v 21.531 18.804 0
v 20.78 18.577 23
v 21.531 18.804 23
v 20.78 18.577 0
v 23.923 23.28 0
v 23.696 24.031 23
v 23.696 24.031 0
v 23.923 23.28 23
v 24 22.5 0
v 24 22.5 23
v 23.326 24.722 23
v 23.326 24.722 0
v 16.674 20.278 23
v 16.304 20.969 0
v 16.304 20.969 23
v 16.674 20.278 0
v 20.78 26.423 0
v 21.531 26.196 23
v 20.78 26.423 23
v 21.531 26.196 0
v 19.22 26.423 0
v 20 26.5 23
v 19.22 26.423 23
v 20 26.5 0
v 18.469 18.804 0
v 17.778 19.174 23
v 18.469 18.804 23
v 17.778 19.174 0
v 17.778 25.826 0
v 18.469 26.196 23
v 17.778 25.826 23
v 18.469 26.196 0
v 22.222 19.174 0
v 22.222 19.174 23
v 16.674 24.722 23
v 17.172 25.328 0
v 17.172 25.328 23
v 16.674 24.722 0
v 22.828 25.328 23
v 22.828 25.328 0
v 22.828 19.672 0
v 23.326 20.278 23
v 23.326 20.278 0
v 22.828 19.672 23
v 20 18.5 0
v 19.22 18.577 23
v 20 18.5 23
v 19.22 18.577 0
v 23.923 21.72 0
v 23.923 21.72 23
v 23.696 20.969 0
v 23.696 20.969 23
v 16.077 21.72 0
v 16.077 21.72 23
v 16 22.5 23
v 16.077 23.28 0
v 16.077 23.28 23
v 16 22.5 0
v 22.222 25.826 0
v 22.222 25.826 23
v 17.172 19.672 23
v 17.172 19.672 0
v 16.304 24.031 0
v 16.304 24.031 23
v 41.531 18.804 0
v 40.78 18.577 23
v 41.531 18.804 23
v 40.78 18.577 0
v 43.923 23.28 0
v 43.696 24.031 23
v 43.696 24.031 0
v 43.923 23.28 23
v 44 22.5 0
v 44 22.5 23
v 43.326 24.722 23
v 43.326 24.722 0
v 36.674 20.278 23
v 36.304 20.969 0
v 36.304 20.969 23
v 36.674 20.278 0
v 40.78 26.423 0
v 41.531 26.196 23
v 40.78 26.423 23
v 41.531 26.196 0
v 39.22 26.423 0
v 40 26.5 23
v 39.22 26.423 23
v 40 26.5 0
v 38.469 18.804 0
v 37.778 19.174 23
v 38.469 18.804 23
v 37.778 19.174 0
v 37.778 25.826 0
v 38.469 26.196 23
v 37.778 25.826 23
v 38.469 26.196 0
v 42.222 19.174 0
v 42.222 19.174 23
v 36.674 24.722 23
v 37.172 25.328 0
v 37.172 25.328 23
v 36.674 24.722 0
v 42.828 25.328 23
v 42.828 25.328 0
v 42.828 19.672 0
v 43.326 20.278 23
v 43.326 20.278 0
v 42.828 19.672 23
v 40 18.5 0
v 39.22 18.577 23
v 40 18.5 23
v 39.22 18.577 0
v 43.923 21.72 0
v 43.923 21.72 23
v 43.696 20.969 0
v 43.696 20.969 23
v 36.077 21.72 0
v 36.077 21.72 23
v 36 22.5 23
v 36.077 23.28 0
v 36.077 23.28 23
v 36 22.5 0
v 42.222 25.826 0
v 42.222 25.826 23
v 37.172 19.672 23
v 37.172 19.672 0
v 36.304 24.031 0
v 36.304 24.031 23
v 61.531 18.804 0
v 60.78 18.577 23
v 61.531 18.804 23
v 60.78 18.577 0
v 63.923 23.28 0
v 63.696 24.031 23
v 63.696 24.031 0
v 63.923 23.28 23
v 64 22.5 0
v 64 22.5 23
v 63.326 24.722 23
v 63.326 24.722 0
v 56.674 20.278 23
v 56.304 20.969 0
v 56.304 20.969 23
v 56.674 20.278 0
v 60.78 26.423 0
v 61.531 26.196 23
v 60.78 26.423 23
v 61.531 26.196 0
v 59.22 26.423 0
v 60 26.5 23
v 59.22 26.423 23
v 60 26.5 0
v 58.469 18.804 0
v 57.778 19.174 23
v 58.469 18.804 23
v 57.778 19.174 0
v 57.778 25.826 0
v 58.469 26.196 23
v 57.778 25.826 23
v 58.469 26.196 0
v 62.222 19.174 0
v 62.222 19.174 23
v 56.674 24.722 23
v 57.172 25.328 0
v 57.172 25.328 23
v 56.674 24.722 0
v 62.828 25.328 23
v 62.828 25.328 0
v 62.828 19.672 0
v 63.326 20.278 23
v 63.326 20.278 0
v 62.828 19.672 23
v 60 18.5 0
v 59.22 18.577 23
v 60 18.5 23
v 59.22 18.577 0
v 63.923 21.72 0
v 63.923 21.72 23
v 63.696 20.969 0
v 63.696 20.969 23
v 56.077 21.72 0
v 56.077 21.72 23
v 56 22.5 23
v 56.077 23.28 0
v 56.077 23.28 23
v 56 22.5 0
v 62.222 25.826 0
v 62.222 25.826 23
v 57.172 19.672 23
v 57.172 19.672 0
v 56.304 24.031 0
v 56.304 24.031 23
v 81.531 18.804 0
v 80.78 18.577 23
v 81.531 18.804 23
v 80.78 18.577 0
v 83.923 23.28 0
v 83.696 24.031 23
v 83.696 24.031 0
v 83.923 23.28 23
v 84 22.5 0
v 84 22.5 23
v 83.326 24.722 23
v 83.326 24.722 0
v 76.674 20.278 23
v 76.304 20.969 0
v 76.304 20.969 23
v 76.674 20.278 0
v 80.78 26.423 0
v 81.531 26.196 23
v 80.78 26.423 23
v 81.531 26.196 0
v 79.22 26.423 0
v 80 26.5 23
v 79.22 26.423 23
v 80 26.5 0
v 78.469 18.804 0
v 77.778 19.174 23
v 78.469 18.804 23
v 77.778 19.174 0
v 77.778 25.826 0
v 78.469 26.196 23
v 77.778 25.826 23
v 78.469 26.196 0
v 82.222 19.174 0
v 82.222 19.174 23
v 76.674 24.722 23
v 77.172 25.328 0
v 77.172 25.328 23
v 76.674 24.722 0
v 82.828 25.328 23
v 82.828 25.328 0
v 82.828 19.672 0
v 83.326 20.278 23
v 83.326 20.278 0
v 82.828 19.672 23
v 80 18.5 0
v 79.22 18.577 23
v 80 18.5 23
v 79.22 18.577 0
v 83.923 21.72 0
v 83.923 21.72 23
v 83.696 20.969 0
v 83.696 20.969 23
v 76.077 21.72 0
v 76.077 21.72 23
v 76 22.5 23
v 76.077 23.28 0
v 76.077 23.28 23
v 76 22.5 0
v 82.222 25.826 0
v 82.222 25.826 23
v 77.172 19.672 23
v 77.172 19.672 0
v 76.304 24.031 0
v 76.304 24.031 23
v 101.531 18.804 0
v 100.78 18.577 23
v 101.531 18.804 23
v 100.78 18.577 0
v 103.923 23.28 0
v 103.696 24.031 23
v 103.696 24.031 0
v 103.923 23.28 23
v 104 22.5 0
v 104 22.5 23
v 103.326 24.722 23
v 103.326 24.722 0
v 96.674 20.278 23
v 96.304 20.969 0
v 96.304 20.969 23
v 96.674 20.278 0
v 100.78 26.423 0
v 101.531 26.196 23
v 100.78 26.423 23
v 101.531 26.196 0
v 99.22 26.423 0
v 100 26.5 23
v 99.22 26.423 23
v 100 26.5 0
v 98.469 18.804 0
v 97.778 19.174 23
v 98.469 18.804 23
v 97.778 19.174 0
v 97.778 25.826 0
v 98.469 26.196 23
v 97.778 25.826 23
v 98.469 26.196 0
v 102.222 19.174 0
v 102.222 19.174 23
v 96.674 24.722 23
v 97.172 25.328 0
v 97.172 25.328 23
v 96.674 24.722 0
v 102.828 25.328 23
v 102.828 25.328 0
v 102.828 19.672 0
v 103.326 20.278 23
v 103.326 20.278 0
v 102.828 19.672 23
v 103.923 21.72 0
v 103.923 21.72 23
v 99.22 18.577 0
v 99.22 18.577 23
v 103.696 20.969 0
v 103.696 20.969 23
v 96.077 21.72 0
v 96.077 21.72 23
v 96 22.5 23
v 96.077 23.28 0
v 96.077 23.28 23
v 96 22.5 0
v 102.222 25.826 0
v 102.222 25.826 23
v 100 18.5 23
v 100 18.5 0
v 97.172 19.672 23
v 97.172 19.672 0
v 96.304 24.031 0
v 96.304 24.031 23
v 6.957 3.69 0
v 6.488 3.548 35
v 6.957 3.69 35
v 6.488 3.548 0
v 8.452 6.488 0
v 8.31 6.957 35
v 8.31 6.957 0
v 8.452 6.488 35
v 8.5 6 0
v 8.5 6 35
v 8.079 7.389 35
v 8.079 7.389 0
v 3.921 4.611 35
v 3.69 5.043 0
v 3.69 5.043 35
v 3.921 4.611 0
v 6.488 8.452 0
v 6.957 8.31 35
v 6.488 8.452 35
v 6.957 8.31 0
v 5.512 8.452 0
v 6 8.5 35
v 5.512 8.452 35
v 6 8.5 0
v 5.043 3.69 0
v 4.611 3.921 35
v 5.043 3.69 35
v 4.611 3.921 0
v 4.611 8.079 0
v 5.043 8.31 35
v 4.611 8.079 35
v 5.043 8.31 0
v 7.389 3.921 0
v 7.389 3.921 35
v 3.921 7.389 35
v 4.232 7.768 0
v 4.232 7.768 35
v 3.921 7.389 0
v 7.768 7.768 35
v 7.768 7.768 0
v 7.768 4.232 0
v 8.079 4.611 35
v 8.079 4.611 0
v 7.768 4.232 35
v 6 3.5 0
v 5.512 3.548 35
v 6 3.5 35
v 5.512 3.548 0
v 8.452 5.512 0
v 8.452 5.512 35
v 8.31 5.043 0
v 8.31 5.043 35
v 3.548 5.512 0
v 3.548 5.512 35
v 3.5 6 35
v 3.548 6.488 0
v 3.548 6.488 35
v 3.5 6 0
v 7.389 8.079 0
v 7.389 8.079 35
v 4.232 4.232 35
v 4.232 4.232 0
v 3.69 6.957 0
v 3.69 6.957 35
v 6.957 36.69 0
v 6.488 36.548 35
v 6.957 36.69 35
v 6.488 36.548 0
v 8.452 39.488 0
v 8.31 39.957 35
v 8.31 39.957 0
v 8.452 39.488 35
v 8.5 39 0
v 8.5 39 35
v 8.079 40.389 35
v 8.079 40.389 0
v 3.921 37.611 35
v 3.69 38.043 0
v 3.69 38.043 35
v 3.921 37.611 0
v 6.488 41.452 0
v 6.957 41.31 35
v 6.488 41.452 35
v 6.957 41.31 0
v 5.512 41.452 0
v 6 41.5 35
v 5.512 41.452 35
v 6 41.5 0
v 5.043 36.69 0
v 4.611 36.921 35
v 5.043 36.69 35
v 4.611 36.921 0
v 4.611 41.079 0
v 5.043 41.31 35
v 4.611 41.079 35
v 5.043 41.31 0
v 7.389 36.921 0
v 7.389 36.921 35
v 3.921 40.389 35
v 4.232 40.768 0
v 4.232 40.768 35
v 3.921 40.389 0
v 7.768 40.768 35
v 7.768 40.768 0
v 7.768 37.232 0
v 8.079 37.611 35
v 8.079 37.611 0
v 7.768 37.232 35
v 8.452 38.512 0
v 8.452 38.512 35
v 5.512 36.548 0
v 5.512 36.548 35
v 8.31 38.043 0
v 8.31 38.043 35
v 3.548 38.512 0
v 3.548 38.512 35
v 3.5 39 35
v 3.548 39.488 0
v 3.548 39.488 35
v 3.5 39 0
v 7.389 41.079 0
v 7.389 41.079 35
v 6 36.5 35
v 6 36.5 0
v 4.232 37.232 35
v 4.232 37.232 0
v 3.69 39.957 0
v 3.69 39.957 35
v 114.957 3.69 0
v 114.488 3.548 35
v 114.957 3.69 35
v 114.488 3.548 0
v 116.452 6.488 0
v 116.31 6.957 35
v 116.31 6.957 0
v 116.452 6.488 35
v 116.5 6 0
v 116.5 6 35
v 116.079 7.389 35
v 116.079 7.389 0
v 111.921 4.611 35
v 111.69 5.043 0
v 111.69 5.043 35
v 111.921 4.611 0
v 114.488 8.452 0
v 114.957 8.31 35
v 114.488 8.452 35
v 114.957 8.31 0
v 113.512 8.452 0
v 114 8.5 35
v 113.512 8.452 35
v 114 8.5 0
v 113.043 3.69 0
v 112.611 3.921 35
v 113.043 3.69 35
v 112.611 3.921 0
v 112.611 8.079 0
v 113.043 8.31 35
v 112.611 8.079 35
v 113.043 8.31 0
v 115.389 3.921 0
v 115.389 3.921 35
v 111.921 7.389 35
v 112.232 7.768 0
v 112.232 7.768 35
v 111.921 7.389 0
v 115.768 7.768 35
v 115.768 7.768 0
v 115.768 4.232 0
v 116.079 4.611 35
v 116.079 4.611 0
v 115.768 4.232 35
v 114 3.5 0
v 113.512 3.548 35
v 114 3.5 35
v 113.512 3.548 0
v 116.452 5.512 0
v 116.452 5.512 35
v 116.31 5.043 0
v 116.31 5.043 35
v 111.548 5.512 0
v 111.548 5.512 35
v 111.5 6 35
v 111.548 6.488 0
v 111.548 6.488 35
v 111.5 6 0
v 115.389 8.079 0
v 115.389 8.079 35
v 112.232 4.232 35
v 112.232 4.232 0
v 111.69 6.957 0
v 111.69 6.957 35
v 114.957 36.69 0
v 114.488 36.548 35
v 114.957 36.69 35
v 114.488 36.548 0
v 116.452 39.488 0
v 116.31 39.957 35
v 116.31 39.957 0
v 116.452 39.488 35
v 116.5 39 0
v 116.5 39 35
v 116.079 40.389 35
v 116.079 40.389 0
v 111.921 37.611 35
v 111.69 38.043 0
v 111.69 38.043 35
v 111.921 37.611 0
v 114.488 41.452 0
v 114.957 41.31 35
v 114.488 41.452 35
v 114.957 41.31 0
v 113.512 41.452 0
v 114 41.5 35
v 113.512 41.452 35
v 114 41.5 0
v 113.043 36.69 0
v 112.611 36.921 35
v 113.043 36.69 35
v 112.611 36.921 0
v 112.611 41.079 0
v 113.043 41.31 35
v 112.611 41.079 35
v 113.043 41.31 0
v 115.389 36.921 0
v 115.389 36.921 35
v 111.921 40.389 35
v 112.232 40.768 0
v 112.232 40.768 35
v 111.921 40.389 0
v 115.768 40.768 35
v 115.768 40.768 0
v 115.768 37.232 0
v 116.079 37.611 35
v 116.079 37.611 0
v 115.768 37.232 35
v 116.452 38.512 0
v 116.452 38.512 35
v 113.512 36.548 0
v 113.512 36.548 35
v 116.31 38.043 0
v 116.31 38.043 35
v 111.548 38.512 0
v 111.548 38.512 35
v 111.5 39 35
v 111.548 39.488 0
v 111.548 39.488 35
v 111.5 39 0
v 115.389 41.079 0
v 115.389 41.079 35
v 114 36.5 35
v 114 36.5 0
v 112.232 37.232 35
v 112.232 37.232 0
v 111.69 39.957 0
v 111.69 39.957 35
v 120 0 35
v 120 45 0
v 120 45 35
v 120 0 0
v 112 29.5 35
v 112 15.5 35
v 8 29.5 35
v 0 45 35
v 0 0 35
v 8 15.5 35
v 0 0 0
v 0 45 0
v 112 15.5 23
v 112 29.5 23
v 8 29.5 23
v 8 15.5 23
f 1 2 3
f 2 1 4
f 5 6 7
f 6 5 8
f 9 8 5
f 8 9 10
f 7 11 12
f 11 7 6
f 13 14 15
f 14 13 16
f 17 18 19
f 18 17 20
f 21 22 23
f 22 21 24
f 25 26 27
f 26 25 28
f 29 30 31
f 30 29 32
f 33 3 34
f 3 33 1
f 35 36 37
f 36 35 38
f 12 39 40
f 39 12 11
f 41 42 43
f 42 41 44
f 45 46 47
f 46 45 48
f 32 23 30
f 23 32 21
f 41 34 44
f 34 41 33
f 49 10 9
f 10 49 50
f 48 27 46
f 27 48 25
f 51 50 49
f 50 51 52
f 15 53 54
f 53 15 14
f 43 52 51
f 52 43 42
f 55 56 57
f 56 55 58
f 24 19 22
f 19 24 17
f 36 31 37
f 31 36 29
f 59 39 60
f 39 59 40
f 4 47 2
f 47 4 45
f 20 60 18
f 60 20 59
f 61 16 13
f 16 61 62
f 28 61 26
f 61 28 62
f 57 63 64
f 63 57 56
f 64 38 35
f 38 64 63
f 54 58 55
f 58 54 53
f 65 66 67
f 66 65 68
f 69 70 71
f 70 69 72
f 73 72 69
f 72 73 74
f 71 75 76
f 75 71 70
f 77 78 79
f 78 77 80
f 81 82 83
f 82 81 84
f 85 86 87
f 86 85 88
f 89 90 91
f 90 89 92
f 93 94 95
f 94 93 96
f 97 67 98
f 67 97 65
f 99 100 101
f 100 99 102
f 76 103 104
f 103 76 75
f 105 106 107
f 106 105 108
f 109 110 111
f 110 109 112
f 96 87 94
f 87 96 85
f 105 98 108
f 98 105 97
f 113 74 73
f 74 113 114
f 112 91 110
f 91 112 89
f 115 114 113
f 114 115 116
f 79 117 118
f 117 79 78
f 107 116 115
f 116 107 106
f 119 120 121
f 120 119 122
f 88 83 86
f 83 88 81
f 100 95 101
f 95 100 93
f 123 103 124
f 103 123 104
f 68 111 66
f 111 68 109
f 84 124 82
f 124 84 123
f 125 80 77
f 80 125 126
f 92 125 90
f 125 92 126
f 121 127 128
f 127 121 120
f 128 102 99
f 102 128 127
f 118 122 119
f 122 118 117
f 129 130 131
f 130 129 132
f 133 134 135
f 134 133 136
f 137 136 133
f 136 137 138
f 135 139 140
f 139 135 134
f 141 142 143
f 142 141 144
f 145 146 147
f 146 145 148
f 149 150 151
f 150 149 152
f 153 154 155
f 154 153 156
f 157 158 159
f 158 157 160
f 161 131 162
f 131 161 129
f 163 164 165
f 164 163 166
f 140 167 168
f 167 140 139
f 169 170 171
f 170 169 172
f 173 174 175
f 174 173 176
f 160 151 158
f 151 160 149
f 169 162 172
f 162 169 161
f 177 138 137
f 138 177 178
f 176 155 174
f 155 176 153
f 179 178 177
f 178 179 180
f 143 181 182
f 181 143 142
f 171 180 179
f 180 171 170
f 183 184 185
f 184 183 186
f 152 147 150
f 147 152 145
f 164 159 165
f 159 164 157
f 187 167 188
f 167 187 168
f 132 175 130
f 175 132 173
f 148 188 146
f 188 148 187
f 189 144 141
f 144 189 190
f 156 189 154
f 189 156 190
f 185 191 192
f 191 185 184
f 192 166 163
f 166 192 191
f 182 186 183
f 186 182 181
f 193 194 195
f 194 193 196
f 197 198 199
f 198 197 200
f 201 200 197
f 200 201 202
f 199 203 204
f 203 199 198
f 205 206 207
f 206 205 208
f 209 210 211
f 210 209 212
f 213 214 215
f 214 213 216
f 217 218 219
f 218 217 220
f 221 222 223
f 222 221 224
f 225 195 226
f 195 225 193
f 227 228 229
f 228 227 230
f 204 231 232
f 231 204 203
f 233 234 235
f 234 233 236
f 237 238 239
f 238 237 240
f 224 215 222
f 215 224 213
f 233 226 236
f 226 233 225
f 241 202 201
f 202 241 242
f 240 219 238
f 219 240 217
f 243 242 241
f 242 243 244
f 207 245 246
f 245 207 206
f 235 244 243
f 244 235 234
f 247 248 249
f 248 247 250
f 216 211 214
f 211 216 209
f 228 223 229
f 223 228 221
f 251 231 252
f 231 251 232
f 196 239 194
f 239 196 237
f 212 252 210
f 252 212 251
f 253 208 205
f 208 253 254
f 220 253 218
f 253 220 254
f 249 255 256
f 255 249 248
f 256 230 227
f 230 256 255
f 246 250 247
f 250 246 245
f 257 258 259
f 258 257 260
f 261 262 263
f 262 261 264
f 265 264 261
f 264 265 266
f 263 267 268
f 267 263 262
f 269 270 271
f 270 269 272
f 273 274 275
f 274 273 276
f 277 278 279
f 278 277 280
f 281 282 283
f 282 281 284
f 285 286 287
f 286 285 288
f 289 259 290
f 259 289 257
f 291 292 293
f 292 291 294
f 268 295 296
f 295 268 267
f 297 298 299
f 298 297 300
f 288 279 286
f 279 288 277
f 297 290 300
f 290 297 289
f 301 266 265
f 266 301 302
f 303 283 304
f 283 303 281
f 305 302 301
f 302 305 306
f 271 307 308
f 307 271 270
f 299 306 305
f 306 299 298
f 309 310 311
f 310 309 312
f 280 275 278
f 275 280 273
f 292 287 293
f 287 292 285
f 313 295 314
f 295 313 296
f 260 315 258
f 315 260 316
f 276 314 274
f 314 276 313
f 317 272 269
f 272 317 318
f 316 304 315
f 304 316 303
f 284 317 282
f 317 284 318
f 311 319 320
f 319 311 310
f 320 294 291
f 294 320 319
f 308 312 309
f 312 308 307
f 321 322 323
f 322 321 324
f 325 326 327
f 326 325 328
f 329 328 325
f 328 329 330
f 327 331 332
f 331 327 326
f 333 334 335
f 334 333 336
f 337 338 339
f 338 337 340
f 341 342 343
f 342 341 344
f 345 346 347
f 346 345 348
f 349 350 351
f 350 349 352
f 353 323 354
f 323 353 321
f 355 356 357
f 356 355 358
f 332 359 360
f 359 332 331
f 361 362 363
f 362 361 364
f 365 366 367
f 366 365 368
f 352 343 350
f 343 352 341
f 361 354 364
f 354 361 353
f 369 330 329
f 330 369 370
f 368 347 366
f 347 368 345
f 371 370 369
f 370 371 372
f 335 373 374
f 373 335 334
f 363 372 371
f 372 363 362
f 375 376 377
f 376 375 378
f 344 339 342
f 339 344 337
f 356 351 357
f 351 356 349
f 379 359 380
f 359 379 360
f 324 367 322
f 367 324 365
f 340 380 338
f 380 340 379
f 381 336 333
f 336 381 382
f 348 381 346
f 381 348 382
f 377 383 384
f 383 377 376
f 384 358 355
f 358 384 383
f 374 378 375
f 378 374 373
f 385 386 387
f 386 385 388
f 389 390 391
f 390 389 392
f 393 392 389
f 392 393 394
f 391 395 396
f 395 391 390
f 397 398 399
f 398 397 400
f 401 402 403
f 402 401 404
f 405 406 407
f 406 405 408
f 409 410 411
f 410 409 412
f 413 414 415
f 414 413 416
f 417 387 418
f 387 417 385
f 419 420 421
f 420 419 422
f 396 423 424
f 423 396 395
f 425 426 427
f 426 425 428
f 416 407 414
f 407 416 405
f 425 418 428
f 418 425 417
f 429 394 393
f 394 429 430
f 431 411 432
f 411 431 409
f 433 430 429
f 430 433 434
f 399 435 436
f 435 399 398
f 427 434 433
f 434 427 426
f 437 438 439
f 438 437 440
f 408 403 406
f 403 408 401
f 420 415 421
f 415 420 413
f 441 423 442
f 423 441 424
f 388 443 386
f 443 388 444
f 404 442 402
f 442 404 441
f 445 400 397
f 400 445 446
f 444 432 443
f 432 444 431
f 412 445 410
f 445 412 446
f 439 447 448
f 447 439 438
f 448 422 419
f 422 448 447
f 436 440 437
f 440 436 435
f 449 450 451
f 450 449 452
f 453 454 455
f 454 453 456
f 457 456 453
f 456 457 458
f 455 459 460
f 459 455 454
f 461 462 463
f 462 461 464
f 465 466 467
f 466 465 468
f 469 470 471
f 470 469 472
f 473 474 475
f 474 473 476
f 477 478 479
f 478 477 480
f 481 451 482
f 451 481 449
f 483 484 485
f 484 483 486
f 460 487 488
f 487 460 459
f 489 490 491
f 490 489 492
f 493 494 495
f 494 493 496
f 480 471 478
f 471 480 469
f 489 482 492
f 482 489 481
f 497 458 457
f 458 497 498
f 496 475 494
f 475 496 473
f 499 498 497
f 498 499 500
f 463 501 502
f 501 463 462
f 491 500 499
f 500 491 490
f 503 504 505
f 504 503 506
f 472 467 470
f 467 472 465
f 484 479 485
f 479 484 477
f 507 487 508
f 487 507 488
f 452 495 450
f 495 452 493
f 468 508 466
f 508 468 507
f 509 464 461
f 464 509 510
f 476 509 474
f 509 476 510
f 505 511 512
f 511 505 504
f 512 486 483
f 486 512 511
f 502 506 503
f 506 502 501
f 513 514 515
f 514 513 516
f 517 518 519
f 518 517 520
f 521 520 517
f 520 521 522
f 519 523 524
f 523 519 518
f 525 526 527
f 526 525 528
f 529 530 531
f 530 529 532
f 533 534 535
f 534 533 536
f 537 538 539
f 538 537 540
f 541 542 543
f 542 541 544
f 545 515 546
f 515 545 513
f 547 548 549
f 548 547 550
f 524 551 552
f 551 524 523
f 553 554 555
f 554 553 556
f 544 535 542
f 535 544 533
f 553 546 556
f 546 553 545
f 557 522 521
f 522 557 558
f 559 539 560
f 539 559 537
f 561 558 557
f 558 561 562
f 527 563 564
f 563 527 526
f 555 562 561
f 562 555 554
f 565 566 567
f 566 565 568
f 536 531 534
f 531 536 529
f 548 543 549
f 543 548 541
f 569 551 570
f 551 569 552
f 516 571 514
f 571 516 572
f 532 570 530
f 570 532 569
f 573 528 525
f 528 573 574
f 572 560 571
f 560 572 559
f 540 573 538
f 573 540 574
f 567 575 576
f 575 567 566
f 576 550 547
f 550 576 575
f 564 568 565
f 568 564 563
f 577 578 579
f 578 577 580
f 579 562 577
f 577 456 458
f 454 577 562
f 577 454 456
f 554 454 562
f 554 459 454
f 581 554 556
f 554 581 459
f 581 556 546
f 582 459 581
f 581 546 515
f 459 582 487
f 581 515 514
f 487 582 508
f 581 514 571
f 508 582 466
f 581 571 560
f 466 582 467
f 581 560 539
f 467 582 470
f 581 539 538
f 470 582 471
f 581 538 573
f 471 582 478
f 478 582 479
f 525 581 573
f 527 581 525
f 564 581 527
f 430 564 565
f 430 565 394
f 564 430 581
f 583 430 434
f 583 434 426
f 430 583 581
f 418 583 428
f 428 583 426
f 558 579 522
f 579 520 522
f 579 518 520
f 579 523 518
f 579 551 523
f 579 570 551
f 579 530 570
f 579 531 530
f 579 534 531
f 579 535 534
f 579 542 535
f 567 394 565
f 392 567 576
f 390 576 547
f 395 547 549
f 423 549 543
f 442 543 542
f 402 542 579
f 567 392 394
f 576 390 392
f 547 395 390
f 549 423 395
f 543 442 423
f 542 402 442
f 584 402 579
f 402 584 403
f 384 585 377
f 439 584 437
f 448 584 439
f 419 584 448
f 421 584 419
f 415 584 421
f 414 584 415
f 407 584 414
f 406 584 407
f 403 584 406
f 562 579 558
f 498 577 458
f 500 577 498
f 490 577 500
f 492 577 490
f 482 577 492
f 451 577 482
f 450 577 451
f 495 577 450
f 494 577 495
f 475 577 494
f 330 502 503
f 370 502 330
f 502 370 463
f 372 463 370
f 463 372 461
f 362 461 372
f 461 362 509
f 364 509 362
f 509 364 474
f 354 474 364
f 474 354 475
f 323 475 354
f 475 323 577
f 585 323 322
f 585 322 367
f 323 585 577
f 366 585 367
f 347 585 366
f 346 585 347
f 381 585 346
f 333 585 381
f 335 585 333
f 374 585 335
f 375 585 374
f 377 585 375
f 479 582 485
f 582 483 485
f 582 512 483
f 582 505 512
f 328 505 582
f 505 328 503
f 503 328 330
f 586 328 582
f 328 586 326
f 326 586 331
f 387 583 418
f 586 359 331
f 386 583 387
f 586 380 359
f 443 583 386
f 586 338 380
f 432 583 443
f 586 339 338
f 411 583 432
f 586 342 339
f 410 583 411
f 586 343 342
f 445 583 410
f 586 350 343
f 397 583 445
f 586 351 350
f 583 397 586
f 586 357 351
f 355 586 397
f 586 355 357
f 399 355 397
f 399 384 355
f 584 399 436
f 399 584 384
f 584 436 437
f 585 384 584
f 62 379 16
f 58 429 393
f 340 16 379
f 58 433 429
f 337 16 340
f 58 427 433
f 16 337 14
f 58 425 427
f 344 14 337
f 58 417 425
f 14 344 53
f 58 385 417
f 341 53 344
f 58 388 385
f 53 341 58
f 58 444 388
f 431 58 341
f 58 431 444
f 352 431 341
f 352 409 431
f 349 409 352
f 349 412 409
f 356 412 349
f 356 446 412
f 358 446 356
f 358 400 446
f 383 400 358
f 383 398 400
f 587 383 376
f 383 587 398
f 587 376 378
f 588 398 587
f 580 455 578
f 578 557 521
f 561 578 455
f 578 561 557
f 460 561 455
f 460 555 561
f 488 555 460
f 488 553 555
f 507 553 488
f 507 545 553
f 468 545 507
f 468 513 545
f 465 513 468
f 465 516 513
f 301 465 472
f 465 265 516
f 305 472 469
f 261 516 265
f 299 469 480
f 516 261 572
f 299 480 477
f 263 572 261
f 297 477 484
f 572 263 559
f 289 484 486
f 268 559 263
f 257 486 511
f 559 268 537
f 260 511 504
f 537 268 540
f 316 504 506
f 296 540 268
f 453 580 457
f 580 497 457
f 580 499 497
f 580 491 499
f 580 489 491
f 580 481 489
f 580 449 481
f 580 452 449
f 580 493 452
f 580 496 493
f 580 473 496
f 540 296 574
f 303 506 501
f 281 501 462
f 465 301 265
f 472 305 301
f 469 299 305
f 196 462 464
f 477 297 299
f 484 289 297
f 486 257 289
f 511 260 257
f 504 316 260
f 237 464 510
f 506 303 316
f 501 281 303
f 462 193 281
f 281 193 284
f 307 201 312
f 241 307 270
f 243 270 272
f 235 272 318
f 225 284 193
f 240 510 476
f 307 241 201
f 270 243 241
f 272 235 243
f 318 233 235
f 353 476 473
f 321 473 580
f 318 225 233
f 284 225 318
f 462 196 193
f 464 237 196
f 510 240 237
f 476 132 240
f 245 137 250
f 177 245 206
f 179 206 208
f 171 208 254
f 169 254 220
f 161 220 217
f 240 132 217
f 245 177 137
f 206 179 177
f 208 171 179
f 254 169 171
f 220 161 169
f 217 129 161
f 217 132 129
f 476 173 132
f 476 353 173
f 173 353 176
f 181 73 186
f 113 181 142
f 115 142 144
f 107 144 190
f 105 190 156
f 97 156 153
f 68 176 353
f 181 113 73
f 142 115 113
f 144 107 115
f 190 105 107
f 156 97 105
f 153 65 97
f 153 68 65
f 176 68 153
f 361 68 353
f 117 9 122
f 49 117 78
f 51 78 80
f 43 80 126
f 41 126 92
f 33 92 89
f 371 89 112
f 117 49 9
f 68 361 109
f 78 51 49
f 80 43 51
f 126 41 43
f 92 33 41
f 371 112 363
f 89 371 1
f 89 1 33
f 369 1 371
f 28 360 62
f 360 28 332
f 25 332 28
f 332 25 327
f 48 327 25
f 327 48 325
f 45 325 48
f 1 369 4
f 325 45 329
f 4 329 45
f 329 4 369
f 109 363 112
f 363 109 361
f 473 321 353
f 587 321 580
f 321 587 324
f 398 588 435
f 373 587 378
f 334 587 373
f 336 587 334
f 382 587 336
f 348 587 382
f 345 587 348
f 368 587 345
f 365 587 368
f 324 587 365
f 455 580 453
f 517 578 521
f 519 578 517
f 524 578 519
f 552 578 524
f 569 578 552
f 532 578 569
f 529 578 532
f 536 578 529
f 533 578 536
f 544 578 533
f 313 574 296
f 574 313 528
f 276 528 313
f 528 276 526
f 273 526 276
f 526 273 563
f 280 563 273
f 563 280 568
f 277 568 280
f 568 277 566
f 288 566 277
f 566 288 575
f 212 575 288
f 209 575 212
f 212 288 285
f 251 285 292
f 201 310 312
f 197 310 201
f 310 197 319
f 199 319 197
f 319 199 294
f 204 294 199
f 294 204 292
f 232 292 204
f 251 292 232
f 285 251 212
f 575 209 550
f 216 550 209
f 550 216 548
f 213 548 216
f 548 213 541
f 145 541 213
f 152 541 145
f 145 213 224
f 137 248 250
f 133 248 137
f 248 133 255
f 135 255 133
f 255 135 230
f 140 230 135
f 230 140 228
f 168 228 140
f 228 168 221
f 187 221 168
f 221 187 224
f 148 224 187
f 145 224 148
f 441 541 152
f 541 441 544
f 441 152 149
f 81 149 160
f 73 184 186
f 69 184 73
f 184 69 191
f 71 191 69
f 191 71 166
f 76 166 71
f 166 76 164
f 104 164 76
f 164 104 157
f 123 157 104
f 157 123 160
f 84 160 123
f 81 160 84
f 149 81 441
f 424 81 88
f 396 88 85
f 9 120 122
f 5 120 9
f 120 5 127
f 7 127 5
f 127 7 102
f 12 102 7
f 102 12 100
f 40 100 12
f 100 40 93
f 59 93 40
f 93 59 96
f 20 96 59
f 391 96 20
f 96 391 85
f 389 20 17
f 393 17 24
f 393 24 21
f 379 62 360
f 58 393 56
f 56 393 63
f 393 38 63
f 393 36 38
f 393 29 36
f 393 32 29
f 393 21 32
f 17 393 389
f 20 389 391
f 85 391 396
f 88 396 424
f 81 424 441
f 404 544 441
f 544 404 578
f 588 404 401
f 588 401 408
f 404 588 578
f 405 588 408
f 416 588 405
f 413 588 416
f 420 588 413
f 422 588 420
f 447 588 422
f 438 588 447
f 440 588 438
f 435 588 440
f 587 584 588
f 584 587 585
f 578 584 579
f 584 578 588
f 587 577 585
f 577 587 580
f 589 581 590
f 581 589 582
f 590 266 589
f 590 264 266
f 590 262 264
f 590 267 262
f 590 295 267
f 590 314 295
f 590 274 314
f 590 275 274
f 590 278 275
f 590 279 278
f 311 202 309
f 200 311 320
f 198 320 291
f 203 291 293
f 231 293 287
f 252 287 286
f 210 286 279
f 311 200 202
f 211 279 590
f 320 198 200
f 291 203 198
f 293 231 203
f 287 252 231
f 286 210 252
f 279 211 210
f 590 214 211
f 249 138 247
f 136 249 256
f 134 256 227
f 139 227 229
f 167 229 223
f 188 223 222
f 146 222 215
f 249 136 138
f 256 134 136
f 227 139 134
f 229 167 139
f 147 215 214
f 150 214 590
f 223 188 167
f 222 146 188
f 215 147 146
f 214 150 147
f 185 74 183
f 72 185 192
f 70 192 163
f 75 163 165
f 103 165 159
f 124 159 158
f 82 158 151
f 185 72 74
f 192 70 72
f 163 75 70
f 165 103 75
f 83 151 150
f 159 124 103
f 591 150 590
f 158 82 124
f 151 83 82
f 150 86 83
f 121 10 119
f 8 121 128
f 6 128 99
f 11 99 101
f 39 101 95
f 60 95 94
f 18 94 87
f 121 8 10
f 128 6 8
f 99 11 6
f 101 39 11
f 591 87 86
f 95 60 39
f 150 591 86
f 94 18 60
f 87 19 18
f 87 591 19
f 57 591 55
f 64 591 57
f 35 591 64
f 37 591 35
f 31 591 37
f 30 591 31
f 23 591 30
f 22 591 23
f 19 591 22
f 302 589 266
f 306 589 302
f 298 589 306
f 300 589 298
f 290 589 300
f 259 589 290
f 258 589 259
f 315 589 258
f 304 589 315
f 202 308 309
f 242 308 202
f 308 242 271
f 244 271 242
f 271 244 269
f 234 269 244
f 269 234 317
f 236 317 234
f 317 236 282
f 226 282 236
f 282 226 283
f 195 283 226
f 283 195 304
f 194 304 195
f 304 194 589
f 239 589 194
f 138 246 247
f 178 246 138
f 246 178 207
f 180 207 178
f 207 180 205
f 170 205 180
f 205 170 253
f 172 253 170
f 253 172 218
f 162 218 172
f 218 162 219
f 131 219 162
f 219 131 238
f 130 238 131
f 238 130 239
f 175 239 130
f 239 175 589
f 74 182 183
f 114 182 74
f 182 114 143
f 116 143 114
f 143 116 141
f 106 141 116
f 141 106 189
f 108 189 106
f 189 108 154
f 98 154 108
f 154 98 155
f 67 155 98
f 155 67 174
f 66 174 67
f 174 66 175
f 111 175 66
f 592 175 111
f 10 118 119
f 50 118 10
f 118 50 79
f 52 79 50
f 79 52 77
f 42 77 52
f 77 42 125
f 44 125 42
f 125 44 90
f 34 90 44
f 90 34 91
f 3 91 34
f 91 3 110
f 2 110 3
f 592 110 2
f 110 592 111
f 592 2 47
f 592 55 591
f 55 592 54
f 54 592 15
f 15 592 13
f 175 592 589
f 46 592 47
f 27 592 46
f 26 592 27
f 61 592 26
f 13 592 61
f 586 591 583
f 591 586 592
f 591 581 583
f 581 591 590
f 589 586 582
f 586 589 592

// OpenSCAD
$fn = 32;

// ----------------------------------------------------------------------
// Manifold block: gallery_top manifold
// ----------------------------------------------------------------------

// --- parameters (mm) ---
block_l = 120;            // block length, X
block_w = 45;             // block width, Y
block_h = 35;             // block height, Z
port_d = 8;               // port bore diameter
port_pitch = 20;          // port pitch along X
gallery_d = 14;           // top gallery width, Y
gallery_depth = 12;       // gallery pocket depth
wall_p = 8;               // gallery end wall thickness, X
mnt_d = 5;                // mounting hole diameter
mnt_in = 6;               // mounting hole inset from the edges
fit_tol = 0.1;            // tolerance for press fits, mm
free_tol = 0.3;           // tolerance for clearance fits, mm

n_ports = 5;  // ports in the row
port_x0 = (block_l - (n_ports - 1) * port_pitch) / 2;  // first port X

difference() {
  cube([block_l, block_w, block_h]);
  for (i = [0 : n_ports - 1])
    translate([port_x0 + i * port_pitch, block_w / 2, -1])
      cylinder(h = block_h + 2, d = port_d);
  translate([wall_p, block_w / 2 - gallery_d / 2, block_h - gallery_depth])
    cube([block_l - 2 * wall_p, gallery_d, gallery_depth + 1]);
  for (cx = [mnt_in, block_l - mnt_in])
    for (cy = [mnt_in, block_w - mnt_in])
      translate([cx, cy, -1]) cylinder(h = block_h + 2, d = mnt_d);
}
